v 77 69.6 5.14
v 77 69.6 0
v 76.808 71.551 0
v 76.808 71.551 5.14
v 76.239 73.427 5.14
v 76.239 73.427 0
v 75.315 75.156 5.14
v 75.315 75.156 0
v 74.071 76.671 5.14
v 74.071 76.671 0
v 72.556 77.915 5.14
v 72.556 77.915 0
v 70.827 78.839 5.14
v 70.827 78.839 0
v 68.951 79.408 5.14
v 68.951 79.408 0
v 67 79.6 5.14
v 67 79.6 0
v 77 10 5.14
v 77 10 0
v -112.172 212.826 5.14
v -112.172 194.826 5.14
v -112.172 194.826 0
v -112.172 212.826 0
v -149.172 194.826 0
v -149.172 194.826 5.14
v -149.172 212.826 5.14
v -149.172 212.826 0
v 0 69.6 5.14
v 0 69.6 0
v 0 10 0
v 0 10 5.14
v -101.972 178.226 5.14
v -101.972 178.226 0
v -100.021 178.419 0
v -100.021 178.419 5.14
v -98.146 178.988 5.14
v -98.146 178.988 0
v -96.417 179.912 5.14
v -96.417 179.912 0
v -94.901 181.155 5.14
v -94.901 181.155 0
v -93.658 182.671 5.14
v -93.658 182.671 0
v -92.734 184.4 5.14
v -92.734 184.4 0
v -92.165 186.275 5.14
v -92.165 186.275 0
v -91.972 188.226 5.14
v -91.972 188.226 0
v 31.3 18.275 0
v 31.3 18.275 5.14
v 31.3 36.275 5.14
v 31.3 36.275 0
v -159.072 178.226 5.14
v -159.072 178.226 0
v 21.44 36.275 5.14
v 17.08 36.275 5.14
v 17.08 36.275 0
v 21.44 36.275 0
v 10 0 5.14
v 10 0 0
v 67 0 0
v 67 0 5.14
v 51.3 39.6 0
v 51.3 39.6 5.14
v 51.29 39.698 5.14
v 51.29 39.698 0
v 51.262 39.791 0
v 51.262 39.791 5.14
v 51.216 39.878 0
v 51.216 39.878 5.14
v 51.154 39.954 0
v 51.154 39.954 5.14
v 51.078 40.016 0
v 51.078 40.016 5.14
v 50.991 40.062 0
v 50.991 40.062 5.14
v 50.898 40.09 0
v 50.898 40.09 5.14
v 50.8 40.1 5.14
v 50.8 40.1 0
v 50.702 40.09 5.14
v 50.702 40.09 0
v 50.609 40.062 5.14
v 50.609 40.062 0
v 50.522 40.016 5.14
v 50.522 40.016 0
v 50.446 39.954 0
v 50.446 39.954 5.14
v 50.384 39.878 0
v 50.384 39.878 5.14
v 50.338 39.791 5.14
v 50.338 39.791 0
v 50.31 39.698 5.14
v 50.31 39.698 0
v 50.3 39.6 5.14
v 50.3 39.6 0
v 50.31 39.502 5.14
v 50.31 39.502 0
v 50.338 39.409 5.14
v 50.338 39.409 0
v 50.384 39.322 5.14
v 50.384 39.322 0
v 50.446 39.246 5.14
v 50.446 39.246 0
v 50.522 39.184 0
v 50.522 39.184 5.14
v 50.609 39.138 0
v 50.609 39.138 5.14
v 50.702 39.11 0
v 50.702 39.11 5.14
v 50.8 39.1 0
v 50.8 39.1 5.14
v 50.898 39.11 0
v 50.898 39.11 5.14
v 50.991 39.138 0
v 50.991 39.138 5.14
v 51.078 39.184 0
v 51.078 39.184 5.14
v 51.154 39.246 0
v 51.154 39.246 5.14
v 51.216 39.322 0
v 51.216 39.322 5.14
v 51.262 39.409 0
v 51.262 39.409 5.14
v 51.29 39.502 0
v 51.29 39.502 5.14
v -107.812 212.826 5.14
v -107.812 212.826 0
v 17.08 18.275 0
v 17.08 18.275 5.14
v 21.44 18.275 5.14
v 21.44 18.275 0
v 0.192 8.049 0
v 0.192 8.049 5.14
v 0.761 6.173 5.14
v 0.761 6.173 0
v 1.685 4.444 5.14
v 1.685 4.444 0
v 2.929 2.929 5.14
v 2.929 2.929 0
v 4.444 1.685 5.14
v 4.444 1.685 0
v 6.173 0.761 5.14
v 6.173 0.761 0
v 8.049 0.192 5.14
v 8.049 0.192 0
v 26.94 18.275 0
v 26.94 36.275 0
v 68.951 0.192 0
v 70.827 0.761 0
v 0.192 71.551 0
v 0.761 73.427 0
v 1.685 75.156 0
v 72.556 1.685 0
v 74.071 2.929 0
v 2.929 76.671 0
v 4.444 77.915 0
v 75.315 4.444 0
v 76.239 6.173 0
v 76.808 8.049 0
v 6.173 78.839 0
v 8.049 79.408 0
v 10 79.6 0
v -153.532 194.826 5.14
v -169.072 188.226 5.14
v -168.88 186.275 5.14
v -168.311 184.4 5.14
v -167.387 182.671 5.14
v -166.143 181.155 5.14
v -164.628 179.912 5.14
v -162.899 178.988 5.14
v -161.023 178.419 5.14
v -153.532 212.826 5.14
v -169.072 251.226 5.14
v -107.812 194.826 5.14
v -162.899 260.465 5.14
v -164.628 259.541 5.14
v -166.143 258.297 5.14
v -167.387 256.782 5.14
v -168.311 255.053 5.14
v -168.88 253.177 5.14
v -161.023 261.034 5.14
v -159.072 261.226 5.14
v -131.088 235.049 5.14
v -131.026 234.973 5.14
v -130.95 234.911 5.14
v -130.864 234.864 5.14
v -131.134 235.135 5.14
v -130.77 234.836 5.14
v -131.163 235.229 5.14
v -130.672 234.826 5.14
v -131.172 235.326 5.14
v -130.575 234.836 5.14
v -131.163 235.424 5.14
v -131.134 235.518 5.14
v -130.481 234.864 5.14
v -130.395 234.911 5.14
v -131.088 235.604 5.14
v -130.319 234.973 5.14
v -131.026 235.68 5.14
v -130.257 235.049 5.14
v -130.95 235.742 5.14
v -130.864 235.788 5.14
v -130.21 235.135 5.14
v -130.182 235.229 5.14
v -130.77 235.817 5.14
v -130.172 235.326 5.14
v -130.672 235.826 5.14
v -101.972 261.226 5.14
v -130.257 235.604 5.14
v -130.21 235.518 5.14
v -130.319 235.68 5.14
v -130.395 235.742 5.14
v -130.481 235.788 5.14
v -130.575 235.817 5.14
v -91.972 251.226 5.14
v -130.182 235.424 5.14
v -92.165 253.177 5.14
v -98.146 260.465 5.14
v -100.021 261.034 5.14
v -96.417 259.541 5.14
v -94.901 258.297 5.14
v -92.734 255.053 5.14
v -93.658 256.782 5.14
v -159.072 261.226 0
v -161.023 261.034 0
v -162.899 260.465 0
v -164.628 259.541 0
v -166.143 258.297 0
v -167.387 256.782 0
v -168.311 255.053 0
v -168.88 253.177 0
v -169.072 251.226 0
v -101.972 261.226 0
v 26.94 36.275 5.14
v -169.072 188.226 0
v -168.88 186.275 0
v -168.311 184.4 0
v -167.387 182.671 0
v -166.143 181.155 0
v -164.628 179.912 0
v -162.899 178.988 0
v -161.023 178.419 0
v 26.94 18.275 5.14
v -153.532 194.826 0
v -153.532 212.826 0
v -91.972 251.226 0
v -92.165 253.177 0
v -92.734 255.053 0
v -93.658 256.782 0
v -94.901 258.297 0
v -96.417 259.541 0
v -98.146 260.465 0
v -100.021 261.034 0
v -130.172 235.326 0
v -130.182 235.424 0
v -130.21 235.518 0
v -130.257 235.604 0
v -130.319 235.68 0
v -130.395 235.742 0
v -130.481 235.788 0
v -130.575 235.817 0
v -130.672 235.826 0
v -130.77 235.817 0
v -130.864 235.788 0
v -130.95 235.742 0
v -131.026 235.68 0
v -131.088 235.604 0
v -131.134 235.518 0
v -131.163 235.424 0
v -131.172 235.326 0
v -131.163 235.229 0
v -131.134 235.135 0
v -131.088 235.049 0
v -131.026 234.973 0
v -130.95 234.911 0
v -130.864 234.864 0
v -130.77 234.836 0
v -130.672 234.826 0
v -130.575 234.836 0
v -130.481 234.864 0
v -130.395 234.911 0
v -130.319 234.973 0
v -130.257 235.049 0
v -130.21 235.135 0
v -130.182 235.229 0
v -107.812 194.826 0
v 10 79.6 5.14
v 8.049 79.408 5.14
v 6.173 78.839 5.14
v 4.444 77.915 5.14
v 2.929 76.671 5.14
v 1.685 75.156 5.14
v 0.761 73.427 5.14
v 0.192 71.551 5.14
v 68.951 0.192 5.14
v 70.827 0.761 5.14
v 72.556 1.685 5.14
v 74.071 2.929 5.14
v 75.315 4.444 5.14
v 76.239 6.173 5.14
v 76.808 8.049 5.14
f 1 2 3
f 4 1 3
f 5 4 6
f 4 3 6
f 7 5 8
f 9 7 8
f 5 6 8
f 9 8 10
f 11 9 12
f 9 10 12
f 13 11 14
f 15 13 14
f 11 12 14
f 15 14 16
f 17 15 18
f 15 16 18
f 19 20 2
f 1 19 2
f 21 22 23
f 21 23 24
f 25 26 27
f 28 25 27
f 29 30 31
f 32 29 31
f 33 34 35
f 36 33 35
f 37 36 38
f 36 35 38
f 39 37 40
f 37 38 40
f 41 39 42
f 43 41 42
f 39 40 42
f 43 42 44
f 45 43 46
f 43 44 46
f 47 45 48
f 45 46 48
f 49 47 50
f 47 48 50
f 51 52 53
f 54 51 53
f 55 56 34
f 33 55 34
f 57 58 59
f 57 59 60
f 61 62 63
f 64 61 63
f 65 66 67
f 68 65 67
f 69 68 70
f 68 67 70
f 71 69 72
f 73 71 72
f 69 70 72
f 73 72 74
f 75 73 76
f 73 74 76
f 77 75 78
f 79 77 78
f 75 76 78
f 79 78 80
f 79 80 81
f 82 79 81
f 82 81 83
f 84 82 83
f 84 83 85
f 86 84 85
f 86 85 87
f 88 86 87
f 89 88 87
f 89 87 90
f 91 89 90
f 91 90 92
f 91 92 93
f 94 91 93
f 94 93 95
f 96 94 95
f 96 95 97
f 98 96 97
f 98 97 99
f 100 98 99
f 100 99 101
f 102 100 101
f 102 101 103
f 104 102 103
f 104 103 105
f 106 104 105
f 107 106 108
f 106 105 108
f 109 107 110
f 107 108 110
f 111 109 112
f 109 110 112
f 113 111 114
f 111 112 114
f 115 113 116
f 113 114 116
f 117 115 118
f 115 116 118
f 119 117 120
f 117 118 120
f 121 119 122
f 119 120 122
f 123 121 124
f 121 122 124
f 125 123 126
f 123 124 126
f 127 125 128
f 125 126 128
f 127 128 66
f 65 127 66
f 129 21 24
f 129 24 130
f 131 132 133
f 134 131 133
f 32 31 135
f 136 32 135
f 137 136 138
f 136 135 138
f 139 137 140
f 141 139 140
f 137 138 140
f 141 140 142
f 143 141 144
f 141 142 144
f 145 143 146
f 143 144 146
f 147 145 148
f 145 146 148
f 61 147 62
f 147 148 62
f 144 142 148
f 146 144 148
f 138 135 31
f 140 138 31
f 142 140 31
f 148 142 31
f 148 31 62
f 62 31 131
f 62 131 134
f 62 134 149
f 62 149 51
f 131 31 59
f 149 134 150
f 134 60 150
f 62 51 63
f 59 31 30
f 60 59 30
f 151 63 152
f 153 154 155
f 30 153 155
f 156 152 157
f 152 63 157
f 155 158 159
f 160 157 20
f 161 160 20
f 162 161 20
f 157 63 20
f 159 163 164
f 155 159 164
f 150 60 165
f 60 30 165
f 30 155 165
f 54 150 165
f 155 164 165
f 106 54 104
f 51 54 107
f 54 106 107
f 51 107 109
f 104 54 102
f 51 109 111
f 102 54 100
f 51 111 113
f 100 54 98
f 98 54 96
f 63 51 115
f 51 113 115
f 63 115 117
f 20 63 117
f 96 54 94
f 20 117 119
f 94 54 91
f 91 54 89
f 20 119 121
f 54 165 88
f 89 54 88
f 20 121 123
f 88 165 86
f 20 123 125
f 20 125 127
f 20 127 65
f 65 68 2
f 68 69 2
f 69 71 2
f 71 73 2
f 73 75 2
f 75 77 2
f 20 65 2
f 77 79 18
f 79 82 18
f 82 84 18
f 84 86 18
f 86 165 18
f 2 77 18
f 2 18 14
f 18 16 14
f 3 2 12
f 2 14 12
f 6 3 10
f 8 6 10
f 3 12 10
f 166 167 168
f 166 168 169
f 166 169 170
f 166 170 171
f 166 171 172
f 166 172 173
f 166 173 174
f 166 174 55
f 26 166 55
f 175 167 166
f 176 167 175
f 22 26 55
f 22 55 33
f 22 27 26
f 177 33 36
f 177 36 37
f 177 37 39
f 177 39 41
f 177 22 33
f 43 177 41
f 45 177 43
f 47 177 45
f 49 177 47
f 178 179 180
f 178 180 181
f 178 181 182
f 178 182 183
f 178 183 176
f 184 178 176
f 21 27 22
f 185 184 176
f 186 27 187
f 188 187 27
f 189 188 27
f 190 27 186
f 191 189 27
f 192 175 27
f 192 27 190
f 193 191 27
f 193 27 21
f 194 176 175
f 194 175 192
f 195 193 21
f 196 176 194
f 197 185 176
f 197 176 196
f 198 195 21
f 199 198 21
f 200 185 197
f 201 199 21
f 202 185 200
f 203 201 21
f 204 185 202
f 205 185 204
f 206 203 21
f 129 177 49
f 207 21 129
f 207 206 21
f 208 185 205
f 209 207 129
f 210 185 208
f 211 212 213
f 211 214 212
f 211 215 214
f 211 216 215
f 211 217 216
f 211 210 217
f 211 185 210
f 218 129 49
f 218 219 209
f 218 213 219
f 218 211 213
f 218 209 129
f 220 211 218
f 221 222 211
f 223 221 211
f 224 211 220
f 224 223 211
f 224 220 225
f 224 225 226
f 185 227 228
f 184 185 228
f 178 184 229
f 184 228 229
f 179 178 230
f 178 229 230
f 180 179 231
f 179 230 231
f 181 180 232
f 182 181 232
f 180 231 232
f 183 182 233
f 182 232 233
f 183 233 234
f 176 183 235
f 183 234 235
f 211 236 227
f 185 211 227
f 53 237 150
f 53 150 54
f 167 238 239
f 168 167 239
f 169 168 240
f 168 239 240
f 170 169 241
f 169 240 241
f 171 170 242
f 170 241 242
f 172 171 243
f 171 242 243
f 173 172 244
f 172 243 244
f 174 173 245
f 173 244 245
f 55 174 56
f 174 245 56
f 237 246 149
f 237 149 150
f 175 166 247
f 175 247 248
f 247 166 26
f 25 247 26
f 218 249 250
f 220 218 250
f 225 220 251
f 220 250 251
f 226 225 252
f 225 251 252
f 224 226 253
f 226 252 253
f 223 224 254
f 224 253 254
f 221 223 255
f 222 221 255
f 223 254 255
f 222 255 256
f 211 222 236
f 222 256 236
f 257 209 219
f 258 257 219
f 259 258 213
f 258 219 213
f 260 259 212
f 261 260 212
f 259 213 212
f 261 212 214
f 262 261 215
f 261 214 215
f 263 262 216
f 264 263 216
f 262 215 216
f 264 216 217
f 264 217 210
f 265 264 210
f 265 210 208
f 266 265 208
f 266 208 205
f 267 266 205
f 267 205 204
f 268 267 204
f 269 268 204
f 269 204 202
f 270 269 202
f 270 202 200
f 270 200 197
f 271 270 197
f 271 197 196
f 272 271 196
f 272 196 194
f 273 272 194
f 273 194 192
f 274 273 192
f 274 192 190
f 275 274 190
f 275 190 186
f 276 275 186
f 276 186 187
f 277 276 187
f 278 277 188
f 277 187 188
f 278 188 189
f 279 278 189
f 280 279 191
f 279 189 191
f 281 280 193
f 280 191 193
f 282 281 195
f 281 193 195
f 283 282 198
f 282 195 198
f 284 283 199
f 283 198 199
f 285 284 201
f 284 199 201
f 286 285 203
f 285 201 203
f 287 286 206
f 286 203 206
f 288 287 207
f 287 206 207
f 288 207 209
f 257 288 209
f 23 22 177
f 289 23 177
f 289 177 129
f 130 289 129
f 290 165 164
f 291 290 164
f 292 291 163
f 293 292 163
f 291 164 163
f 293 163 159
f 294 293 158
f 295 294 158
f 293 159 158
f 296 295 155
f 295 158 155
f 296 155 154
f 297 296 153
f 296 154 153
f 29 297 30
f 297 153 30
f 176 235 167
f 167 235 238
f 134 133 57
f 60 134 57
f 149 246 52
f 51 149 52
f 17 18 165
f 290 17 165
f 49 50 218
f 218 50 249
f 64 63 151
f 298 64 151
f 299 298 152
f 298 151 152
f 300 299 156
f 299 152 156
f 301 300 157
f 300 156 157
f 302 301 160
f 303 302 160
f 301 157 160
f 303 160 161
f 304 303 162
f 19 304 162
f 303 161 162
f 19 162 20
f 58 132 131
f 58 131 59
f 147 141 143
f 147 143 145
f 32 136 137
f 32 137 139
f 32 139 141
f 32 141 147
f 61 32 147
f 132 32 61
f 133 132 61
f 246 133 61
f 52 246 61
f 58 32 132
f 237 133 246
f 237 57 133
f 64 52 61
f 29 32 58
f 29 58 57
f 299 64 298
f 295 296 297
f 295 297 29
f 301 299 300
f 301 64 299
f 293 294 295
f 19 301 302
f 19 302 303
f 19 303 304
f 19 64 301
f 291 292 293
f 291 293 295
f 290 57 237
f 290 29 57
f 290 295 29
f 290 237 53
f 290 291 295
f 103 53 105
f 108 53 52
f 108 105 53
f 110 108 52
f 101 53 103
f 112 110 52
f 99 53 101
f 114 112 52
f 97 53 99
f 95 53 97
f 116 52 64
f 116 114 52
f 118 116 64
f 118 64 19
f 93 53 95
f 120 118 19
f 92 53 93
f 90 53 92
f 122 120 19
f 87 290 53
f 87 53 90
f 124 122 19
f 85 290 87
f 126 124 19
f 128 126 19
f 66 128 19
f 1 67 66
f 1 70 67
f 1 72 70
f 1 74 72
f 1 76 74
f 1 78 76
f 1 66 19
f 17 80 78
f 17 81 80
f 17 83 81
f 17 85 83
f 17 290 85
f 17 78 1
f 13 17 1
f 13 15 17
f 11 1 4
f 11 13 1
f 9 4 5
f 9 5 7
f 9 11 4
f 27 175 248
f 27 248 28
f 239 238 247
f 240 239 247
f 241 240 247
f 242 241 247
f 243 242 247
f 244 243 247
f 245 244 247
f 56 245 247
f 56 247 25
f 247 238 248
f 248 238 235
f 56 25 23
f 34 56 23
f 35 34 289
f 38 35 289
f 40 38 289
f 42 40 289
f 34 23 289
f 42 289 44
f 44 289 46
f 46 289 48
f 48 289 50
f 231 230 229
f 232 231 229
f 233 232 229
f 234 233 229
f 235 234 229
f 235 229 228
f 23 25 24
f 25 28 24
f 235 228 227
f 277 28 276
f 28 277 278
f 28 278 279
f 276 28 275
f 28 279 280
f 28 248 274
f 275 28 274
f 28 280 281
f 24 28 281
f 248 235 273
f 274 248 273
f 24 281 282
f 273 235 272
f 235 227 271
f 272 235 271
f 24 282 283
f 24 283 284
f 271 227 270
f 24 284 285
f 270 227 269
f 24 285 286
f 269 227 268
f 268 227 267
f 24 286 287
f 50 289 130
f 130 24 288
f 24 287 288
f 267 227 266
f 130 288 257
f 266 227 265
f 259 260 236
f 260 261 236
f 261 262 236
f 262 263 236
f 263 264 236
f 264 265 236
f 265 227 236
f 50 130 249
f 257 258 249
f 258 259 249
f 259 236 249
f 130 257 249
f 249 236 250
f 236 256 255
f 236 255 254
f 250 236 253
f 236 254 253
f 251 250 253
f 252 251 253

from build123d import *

# Parameters (mm, degrees)
F0_W     = 35
F0_H     = 35
F1_DEPTH = 5.14
F2_W     = 4.36
F2_H     = 18
F2_R     = 0.5
F3_DEPTH = 5.141
F4_DEPTH = 5.141


with BuildPart() as f1:
    # F0 (on Top) → F1 (new body)
    with BuildSketch(Plane.XY):
        with BuildLine():
            ThreePointArc((-169.072402, 188.226369), (-166.14347, 181.155301), (-159.072402, 178.226369))
            Line((-159.072402, 178.226369), (-101.972402, 178.226369))
            ThreePointArc((-101.972402, 178.226369), (-94.901334, 181.155301), (-91.972402, 188.226369))
            Line((-91.972402, 188.226369), (-91.972402, 251.226369))
            ThreePointArc((-91.972402, 251.226369), (-94.901334, 258.297437), (-101.972402, 261.226369))
            Line((-101.972402, 261.226369), (-159.072402, 261.226369))
            ThreePointArc((-159.072402, 261.226369), (-166.14347, 258.297437), (-169.072402, 251.226369))
            Line((-169.072402, 251.226369), (-169.072402, 188.226369))
        make_face()
        with Locations((-130.672402, 235.326369)):
            Rectangle(F0_W, F0_H, mode=Mode.SUBTRACT)
        with BuildLine():
            ThreePointArc((0, 10), (2.928932, 2.928932), (10, 0))
            Line((10, 0), (67, 0))
            ThreePointArc((67, 0), (74.071068, 2.928932), (77, 10))
            Line((77, 10), (77, 69.6))
            ThreePointArc((77, 69.6), (74.071068, 76.671068), (67, 79.6))
            Line((67, 79.6), (10, 79.6))
            ThreePointArc((10, 79.6), (2.928932, 76.671068), (0, 69.6))
            Line((0, 69.6), (0, 10))
        make_face()
        with Locations((50.8, 39.6)):
            Rectangle(F0_W, F0_H, mode=Mode.SUBTRACT)
        with Locations((50.8, 39.6)):
            Rectangle(F0_W, F0_H)
        with Locations((-130.672402, 235.326369)):
            Rectangle(F0_W, F0_H)
    extrude(amount=F1_DEPTH)

    # F2 (on face) → F3 (cut, through all)
    with BuildSketch(Plane.XY.offset(5.14)):
        with Locations((-151.352402, 203.826369)):
            Rectangle(F2_W, F2_H)
        with Locations((-109.992402, 203.826369)):
            Rectangle(F2_W, F2_H)
        with Locations((19.26, 27.275123)):
            Rectangle(F2_W, F2_H)
        with Locations((29.12, 27.275123)):
            Rectangle(F2_W, F2_H)
        with Locations((50.8, 39.6)):
            Circle(F2_R)
        with Locations((-130.672402, 235.326369)):
            Circle(F2_R)
    extrude(amount=-F3_DEPTH, mode=Mode.SUBTRACT)

    # F2 (on face) → F4 (cut, through all)
    with BuildSketch(Plane.XY.offset(5.14)):
        with Locations((19.26, 27.275123)):
            Rectangle(F2_W, F2_H)
        with Locations((29.12, 27.275123)):
            Rectangle(F2_W, F2_H)
        with Locations((50.8, 39.6)):
            Circle(F2_R)
    extrude(amount=-F4_DEPTH, mode=Mode.SUBTRACT)


solid = f1.part
